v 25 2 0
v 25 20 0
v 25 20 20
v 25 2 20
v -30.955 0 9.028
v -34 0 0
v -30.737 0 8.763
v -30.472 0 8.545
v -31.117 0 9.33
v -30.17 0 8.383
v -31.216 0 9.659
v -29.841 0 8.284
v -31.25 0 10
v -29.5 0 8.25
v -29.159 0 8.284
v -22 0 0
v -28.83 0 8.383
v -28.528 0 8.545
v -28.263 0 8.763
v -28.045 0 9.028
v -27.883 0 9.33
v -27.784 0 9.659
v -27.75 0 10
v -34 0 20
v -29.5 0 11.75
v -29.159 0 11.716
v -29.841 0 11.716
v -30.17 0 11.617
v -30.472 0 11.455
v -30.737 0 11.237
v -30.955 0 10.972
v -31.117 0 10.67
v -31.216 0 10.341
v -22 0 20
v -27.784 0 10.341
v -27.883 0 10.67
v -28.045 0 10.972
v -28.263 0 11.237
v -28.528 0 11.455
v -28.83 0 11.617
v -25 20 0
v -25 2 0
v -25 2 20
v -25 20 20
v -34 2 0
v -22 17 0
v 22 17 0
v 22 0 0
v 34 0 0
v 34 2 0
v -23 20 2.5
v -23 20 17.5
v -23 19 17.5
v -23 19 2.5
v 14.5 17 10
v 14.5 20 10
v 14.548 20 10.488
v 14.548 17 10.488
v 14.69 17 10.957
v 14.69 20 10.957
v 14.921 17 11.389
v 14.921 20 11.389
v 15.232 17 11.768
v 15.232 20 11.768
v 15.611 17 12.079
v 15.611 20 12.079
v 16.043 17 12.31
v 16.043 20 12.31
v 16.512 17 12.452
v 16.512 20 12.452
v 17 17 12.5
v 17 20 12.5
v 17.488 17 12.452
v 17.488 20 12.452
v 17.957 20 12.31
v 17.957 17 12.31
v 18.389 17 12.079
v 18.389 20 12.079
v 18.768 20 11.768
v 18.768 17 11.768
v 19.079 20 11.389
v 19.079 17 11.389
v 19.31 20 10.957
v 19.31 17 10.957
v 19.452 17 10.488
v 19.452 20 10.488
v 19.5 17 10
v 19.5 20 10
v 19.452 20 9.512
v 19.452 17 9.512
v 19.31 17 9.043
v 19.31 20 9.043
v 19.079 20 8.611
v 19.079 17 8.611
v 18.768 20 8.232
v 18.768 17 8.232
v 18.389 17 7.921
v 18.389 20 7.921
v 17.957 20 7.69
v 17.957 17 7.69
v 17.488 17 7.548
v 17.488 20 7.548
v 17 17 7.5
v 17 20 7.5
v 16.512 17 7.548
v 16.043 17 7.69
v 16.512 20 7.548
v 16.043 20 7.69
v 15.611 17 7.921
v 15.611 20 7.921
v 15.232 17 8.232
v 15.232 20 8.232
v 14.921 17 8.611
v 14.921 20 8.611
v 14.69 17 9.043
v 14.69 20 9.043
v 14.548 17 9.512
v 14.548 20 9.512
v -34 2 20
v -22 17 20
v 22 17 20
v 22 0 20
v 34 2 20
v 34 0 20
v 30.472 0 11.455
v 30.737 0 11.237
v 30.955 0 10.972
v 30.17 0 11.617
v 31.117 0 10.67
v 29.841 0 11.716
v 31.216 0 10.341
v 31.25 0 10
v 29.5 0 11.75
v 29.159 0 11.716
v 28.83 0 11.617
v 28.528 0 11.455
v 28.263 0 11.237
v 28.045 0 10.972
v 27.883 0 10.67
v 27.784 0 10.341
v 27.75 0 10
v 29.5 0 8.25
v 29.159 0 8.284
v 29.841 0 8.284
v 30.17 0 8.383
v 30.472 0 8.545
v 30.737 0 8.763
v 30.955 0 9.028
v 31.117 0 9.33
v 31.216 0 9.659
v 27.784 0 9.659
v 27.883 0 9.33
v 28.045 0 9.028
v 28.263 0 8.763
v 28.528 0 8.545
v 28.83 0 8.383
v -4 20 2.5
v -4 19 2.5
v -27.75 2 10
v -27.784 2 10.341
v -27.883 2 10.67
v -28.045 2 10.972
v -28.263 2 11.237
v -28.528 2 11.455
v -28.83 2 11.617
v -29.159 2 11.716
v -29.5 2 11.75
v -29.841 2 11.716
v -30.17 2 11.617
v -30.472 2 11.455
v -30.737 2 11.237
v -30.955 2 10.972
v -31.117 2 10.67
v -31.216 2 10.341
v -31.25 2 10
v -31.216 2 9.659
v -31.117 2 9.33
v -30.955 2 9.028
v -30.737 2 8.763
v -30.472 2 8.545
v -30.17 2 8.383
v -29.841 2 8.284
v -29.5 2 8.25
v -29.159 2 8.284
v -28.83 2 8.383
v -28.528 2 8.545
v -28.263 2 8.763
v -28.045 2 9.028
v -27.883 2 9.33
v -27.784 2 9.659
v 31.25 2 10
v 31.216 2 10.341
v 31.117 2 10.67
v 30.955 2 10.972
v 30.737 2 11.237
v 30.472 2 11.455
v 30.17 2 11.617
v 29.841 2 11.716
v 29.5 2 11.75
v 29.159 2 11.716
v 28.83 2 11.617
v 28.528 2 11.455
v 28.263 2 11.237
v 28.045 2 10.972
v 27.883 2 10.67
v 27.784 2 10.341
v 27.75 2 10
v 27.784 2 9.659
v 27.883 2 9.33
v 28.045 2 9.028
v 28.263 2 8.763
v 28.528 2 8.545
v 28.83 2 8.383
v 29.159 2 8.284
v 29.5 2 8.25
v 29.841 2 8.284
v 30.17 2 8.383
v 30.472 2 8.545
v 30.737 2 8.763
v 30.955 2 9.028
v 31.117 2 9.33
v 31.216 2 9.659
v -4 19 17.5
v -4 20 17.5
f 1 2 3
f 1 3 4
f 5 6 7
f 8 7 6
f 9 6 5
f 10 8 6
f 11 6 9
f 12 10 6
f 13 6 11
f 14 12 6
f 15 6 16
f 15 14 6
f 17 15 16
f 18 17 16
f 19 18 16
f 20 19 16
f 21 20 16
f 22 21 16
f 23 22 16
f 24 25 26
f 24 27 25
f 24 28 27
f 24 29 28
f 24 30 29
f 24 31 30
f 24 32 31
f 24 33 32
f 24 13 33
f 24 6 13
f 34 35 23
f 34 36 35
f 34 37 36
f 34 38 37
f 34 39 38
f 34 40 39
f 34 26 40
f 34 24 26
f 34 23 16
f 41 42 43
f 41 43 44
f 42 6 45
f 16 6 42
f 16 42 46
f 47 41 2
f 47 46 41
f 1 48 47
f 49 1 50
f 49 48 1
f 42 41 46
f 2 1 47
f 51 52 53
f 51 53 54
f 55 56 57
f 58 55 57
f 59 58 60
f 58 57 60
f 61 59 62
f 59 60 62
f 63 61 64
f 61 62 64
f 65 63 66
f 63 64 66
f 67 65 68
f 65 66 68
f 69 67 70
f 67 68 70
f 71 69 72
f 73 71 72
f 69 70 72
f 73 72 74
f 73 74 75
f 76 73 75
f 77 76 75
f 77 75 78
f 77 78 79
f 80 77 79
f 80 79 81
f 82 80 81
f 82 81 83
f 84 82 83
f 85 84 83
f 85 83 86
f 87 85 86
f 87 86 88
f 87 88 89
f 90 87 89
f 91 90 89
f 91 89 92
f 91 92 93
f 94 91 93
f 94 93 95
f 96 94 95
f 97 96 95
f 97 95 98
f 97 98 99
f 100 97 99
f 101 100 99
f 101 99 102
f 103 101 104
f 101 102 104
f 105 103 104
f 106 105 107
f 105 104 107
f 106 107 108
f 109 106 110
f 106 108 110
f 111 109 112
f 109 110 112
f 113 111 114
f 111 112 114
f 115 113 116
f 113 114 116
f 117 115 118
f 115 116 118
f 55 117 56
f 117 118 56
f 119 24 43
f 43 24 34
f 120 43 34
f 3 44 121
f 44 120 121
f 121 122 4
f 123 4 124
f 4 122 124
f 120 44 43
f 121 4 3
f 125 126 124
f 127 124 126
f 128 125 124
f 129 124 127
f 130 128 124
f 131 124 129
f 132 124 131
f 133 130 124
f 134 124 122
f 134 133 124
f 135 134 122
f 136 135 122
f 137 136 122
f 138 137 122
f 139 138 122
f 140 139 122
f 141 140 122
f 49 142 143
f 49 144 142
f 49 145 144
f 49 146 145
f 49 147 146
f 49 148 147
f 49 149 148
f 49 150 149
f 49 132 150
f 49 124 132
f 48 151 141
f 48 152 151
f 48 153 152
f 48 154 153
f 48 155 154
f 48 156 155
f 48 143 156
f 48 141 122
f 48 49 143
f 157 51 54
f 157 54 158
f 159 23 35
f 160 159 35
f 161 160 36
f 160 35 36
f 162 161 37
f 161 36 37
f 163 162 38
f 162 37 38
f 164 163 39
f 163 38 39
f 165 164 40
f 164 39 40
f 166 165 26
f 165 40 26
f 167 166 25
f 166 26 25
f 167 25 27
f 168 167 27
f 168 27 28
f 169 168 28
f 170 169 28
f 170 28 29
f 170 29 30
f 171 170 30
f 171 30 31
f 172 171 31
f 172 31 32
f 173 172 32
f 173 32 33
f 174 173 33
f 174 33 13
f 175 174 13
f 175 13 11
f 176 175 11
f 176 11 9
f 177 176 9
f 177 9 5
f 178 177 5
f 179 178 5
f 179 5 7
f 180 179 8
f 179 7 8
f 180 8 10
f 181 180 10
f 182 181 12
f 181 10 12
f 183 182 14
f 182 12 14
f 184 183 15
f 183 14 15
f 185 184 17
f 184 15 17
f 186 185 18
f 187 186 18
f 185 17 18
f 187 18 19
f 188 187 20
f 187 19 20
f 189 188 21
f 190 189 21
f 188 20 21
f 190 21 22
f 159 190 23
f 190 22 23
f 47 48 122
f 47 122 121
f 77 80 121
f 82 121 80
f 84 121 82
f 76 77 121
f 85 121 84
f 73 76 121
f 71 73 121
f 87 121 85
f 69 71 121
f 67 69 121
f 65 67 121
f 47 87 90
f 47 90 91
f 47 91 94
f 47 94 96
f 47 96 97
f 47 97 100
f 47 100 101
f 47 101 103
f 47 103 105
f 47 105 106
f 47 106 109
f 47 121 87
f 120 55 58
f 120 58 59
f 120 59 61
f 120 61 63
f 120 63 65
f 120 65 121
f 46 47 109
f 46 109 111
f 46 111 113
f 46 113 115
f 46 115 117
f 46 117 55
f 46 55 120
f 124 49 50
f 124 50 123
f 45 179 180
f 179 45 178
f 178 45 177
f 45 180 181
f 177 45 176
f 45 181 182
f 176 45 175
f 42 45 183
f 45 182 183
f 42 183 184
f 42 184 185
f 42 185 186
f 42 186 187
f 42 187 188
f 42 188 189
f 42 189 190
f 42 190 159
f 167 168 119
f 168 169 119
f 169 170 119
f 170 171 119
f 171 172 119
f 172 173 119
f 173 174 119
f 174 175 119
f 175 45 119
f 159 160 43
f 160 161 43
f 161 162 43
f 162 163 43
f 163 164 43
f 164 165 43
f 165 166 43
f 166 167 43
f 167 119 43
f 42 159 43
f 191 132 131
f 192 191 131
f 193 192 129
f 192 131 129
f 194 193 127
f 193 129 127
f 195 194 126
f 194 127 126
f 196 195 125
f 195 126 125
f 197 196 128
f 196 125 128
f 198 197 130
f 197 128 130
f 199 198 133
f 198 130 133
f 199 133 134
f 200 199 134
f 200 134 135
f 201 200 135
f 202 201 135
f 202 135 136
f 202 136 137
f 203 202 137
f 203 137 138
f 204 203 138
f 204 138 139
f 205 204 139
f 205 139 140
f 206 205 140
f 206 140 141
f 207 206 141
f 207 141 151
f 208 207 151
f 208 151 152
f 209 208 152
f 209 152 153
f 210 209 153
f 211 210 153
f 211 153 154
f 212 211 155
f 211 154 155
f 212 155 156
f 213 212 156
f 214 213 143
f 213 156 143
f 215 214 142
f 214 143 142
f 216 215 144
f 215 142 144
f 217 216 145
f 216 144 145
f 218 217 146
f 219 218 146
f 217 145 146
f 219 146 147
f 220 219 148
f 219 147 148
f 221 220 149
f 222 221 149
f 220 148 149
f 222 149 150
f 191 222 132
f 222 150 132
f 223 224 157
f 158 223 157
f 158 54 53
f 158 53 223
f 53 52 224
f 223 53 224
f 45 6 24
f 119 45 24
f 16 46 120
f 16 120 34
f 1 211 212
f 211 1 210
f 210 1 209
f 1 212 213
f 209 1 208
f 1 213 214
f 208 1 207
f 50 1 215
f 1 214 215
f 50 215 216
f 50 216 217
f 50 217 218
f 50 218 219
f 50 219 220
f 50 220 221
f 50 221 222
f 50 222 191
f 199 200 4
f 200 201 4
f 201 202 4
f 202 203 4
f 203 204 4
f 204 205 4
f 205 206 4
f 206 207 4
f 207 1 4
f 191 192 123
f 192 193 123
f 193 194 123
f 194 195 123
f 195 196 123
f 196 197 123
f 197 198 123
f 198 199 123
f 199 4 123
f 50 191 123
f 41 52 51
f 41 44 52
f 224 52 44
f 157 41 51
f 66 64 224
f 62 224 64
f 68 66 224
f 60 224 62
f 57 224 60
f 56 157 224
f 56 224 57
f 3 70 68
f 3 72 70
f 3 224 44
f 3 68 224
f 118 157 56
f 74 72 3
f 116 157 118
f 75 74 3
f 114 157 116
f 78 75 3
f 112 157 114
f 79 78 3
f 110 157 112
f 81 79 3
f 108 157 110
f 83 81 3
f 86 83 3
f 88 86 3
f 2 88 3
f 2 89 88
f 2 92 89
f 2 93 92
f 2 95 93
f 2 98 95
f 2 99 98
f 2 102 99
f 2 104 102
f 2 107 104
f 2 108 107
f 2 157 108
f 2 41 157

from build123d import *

# Parameters (mm, degrees)
BOSS_EXTRUDE1_DEPTH = 20
SKETCH2_W           = 19
SKETCH2_H           = 15
CUT_EXTRUDE1_DEPTH  = 1
SKETCH3_R           = 2.5
CUT_EXTRUDE2_DEPTH  = 38.749172176
SKETCH4_W           = 9
SKETCH4_H           = 20
BOSS_EXTRUDE2_DEPTH = 2
SKETCH5_R           = 1.75
CUT_EXTRUDE3_DEPTH  = 45.226688775


with BuildPart() as part:
    # Sketch1 → Boss-Extrude1 (new body)
    with BuildSketch(Plane.XY):
        Polygon((22, 0), (22, 17), (-22, 17), (-22, 0), (-25, 0), (-25, 20), (25, 20), (25, 0), align=None)
    extrude(amount=BOSS_EXTRUDE1_DEPTH)

    # Sketch2 → Cut-Extrude1 (cut)
    with BuildSketch(Plane(origin=(0, 20, 0), x_dir=(1, 0, 0), z_dir=(0, 1, 0))):
        with Locations((-13.5, -10)):
            Rectangle(SKETCH2_W, SKETCH2_H)
    extrude(amount=-CUT_EXTRUDE1_DEPTH, mode=Mode.SUBTRACT)

    # Sketch3 → Cut-Extrude2 (cut, through all)
    with BuildSketch(Plane(origin=(0, 20, 0), x_dir=(1, 0, 0), z_dir=(0, 1, 0))):
        with Locations(Location((17, -10, 0), (0, 0, 180))):
            Circle(SKETCH3_R)
    extrude(amount=-CUT_EXTRUDE2_DEPTH, mode=Mode.SUBTRACT)

    # Sketch4 → Boss-Extrude2 (add)
    with BuildSketch(Plane.XZ):
        with Locations((-29.5, 10)):
            Rectangle(SKETCH4_W, SKETCH4_H)
        with Locations((29.5, 10)):
            Rectangle(SKETCH4_W, SKETCH4_H)
    extrude(amount=-BOSS_EXTRUDE2_DEPTH)

    # Sketch5 → Cut-Extrude3 (cut, through all)
    with BuildSketch(Plane.XZ):
        with Locations((-29.5, 10)):
            Circle(SKETCH5_R)
        with Locations((29.5, 10)):
            Circle(SKETCH5_R)
    extrude(amount=-CUT_EXTRUDE3_DEPTH, mode=Mode.SUBTRACT)


solid = part.part
